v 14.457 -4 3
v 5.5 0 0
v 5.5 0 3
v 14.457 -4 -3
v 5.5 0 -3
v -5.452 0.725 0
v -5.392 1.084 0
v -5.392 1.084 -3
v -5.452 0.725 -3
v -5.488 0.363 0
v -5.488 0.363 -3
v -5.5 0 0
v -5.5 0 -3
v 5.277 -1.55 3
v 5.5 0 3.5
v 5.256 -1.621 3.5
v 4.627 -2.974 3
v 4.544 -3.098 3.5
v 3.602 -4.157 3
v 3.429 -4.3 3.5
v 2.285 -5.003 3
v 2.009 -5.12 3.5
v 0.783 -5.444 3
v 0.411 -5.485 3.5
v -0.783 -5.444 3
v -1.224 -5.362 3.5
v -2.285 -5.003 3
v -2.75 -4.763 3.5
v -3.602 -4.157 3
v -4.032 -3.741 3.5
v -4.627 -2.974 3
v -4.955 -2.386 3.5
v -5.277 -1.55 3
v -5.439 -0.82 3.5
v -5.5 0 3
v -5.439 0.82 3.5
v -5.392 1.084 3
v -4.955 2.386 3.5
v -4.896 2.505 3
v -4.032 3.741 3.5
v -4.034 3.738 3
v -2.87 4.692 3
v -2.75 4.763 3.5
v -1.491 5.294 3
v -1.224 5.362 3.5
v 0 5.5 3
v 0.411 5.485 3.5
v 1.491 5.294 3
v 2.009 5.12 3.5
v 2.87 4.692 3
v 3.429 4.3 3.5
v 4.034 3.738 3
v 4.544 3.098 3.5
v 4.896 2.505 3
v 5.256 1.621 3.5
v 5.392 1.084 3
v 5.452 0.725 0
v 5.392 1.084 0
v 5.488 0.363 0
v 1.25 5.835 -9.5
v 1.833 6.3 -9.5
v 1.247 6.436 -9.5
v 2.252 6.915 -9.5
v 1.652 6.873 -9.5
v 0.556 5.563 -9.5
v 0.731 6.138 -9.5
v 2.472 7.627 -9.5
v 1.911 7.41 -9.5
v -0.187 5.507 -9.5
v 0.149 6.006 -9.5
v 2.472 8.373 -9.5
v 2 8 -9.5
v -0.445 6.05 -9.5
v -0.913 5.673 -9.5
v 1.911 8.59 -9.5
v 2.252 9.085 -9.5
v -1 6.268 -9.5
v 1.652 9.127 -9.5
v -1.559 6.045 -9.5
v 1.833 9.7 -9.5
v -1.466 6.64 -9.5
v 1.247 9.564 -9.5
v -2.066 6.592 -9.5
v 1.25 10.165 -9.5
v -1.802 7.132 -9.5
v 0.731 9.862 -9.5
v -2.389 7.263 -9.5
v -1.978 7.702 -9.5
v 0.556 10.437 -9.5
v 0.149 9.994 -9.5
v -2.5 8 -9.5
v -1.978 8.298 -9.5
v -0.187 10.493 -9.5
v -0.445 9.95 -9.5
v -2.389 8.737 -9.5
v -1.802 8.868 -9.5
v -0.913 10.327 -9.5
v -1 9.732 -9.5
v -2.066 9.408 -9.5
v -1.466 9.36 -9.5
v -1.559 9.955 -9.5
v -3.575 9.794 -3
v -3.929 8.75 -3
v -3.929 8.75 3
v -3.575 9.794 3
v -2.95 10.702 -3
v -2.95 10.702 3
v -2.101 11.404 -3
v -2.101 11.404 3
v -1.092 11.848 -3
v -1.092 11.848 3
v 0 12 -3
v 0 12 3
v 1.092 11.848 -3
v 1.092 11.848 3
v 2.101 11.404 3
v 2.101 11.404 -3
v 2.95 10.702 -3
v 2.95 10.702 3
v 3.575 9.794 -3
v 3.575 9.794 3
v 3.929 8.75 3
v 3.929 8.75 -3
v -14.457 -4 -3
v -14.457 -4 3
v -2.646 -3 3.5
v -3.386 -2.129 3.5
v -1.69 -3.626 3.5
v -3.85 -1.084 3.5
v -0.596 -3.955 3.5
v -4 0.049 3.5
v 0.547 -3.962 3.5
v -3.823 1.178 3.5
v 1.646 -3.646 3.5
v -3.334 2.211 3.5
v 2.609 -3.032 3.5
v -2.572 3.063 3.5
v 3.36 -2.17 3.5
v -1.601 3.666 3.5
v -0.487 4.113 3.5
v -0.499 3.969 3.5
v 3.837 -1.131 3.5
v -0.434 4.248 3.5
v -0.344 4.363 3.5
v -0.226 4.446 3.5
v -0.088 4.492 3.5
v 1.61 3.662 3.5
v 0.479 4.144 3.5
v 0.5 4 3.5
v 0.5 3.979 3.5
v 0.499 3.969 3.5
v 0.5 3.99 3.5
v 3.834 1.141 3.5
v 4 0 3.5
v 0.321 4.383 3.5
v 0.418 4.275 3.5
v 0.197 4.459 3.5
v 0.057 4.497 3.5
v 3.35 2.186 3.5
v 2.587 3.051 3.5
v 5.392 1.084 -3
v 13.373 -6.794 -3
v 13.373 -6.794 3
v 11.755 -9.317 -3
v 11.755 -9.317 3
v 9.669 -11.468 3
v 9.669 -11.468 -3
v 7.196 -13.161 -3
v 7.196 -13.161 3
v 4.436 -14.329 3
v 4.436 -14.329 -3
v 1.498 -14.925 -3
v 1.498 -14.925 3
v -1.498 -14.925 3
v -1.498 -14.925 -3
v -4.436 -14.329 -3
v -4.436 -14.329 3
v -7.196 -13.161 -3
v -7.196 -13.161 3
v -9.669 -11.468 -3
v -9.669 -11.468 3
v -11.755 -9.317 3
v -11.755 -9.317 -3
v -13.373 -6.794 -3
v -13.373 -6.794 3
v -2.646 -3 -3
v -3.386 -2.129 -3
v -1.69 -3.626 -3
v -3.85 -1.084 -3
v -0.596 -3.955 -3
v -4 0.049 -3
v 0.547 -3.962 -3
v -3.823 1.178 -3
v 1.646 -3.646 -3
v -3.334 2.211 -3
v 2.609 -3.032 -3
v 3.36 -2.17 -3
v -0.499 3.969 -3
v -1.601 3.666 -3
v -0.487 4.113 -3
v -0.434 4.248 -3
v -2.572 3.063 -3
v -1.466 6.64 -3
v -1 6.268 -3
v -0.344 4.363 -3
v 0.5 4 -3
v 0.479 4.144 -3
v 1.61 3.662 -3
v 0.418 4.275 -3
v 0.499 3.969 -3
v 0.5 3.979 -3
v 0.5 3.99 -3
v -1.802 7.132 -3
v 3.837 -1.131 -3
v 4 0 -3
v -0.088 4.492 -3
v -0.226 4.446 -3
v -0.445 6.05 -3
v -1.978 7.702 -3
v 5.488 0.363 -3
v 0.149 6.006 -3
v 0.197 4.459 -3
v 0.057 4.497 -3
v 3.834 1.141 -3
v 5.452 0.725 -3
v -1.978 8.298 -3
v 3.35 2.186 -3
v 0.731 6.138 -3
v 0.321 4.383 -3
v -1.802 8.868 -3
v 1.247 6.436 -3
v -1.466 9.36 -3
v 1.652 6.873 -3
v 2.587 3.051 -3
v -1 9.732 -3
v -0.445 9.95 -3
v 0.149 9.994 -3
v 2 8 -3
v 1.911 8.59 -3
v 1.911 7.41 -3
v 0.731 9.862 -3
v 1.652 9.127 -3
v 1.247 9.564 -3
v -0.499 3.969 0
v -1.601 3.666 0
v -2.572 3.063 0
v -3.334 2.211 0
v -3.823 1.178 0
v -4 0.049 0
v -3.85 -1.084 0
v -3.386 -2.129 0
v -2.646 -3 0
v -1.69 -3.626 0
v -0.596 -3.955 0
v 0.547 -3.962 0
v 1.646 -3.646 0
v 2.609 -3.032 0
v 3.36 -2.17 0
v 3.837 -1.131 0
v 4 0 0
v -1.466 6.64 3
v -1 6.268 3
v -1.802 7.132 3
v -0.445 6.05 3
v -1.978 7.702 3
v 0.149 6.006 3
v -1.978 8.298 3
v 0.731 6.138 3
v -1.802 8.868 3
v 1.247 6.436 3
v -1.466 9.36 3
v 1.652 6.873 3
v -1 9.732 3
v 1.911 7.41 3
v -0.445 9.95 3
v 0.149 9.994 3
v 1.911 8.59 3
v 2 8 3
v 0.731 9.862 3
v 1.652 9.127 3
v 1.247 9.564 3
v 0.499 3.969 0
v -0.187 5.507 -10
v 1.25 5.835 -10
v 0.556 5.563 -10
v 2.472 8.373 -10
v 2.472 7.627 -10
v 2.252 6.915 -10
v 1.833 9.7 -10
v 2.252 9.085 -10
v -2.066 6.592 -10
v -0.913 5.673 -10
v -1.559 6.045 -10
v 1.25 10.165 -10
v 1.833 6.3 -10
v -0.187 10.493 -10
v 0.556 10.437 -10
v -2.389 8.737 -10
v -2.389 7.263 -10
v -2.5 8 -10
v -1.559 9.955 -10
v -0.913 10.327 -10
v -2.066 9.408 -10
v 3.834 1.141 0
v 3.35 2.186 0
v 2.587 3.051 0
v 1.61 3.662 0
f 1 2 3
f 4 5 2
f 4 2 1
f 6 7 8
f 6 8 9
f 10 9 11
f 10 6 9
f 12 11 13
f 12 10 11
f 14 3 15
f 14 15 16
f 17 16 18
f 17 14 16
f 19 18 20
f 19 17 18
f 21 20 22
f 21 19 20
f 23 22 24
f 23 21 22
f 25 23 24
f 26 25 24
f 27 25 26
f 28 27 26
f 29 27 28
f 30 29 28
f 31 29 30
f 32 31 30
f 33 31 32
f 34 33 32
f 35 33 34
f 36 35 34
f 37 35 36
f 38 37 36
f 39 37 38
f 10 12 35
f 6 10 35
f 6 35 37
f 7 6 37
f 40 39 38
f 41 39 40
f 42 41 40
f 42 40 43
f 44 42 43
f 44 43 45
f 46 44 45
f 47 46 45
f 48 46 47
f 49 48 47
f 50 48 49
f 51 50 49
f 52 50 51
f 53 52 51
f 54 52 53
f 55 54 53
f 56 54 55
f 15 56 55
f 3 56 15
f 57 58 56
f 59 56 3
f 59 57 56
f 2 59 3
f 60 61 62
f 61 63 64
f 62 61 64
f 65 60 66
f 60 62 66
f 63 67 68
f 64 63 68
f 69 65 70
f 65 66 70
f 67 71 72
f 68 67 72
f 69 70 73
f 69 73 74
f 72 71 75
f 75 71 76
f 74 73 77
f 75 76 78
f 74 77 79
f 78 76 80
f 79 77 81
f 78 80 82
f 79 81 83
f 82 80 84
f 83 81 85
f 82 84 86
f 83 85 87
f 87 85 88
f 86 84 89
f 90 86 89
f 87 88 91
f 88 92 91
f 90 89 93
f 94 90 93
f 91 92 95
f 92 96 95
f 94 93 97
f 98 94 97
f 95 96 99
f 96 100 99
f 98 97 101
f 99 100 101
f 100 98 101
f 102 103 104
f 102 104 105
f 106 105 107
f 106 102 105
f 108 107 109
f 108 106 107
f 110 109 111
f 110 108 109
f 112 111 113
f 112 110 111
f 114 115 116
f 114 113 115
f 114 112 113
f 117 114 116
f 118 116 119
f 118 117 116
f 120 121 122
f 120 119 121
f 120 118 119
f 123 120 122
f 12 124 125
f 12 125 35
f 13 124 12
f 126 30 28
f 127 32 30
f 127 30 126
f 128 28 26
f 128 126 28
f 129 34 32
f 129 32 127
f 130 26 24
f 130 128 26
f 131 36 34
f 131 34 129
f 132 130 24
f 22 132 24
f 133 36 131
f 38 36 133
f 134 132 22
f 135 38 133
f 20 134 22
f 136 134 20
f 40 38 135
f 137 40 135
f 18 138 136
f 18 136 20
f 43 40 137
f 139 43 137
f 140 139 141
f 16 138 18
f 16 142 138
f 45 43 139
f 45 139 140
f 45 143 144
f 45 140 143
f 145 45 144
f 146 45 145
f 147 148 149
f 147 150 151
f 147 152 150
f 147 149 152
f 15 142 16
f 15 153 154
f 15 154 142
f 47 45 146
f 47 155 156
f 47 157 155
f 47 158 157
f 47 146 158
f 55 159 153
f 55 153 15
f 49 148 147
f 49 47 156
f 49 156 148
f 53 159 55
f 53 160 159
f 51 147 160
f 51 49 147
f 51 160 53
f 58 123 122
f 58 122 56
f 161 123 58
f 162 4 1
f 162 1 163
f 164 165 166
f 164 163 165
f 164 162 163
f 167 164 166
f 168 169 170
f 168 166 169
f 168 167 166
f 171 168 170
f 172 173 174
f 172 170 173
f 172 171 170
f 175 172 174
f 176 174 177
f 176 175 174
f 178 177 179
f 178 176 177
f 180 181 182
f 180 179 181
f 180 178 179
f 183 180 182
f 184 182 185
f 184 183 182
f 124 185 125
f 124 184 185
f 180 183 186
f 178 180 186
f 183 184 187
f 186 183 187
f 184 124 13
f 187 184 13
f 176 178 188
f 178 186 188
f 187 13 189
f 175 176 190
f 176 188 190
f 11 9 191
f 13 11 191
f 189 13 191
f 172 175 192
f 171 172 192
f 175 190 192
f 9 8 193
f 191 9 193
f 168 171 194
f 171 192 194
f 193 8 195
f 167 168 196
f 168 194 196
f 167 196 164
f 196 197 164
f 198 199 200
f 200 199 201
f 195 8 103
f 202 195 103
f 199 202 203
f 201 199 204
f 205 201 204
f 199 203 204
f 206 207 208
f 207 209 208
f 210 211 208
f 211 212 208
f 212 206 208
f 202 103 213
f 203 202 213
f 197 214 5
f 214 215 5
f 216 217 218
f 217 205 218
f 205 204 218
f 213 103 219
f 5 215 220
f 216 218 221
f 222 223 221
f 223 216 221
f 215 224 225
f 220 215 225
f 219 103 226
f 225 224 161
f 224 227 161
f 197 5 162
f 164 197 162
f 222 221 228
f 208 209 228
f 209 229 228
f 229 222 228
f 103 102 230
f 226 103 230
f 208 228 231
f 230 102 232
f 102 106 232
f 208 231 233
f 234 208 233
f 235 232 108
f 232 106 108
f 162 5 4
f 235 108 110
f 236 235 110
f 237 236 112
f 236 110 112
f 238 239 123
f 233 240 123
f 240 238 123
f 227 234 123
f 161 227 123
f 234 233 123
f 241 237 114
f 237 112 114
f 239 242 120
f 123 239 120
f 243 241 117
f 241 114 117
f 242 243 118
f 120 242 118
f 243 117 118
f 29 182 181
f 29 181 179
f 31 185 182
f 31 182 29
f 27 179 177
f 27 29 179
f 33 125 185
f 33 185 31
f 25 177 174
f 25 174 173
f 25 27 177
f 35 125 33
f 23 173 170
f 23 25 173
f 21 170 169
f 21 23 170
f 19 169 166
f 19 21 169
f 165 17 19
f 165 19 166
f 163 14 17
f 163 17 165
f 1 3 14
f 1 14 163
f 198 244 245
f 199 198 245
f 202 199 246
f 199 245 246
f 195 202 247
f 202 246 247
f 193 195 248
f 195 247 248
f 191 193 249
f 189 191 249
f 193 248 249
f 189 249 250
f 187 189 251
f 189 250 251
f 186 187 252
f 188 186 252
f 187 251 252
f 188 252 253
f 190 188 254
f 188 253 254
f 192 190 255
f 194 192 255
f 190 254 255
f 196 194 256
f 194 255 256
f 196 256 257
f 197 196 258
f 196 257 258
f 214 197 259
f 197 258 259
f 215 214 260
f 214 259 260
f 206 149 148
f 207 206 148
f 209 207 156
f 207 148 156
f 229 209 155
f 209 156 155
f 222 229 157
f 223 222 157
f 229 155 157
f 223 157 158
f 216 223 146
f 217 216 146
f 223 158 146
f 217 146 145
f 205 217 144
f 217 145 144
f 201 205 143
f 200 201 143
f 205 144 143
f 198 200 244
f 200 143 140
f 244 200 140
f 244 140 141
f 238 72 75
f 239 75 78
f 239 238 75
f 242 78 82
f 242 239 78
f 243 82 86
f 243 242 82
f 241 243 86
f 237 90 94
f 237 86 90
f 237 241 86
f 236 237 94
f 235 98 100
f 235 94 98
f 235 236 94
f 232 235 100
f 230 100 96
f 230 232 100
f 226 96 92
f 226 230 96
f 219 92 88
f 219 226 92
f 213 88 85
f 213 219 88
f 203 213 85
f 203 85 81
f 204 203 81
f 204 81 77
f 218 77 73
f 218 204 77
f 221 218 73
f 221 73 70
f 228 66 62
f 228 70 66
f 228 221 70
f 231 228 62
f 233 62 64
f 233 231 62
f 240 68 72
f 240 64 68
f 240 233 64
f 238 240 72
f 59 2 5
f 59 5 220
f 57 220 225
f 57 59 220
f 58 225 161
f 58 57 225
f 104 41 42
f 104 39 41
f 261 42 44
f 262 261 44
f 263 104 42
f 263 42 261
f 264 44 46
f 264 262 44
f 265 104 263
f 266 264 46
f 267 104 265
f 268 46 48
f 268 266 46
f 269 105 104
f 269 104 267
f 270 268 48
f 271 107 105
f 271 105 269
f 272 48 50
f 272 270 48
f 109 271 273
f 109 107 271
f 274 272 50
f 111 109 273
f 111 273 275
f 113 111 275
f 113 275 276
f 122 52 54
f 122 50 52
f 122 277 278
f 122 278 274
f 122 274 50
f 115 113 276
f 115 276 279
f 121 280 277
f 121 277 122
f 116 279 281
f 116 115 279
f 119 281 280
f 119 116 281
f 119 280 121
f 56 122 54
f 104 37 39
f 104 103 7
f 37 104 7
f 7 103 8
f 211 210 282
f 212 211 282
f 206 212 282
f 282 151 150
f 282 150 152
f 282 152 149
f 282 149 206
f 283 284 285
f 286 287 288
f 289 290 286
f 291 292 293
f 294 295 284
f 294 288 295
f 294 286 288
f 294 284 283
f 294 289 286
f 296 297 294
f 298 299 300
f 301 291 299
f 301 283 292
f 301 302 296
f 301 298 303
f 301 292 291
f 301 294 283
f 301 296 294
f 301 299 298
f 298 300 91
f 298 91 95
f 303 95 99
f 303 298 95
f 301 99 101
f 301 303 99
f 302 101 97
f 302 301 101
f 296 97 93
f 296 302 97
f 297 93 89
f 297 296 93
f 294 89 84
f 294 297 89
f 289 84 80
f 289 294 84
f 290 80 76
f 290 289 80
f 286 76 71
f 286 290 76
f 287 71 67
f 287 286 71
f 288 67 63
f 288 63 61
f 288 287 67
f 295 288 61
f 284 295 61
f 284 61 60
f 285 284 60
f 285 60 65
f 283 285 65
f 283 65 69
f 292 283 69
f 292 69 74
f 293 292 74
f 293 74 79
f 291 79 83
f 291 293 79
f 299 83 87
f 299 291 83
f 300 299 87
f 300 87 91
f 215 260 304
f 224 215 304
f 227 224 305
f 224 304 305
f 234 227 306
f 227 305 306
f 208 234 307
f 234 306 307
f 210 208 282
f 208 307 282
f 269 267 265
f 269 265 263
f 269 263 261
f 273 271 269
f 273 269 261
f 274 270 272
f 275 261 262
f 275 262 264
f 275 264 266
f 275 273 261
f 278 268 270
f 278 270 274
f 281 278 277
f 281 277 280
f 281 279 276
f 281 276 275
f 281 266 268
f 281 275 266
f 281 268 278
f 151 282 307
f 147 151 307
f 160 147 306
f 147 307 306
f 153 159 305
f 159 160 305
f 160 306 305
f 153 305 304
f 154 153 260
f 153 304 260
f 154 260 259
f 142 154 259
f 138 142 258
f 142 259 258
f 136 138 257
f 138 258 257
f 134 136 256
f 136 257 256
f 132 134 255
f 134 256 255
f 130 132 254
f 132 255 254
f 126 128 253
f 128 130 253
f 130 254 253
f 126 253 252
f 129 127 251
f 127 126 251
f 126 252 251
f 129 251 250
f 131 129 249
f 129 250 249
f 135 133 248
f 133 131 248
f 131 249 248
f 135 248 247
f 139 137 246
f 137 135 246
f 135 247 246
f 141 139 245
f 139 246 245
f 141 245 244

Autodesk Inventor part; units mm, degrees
ref_plane "YZ Plane" through (0, 0, 0) normal (1, 0, 0) x (0, 1, 0)
ref_plane "XZ Plane" through (0, 0, 0) normal (0, 1, 0) x (-1, 0, 0)
ref_plane "XY Plane" through (0, 0, 0) normal (0, 0, 1) x (1, 0, 0)
sketch "Sketch1" plane through (0, 0, 0) normal (0, 0, 1) x (1, 0, 0)
  line L0 (0, 17.4) -> (0, -20.4) construction
  line L1 (-20.2396, 0) -> (20.2396, 0) construction
  circle A0 centre (0, 0) radius 5.5
  circle A1 centre (0, 8) radius 2
  arc A2 (-14.4568, -4) -> (14.4568, -4) centre (0, 0) ccw
  line L2 (-14.4568, -4) -> (-5.5, 0)
  line L3 (5.5, 0) -> (14.4568, -4)
  line L4 (-3.9291, 8.7499) -> (-5.3921, 1.0839)
  line L5 (3.9291, 8.7499) -> (5.3921, 1.0839)
  arc A3 (3.9291, 8.7499) -> (-3.9291, 8.7499) centre (0, 8) ccw
  circle A4 centre (0, 0) radius 4
  arc A5 (5.3921, 1.0839) -> (-5.3921, 1.0839) centre (0, 0) ccw
  dimension "d0" = 11
  dimension "d1" = 4
  dimension "d3" = 8
  dimension "d4" = 15
  dimension "d5" = 4
  dimension "d7" = 21.61
  dimension "d8" = 4
  dimension "d21" = 8
extrude "Extrusion1" add sketch "Sketch1" along normal mid plane 6 contours L3 A2 L2 A0 | A0 L4 A3 L5
extrude "Extrusion2" add sketch "Sketch1" along normal blind 3.5 contours A0
extrude "Extrusion3" add sketch "Sketch1" against normal up to surface (3 mm away) contours A0
sketch "Sketch2" plane through (0, 0, 3.5) normal (0, 0, 1) x (1, 0, 0)
  circle A0 centre (0, 0) radius 4 construction
  circle A1 centre (0, 0) radius 5.5 construction
  circle A2 centre (0, 4) radius 0.5
  dimension "d16" = 1
extrude "Extrusion4" cut sketch "Sketch2" against normal through all
extrude "Extrusion5" add sketch "Sketch1" against normal blind 10 contours A1
extrude "Extrusion6" add sketch "Sketch1" along normal up to surface (3 mm away) contours A1
sketch "Sketch3" plane through (0, 8, -10) normal (0, 0, -1) x (-1, 0, 0)
  circle A0 centre (0, 0) radius 2 construction
  circle A1 centre (0, 0) radius 2
  circle A2 centre (0, 0) radius 2 projected
  circle A3 centre (0, 0) radius 2.5
  arc A4 (5.3921, -6.9161) -> (-5.3921, -6.9161) centre (0, -8) ccw projected
extrude "Extrusion7" add sketch "Sketch3" against normal blind 0.5
properties part number "Crank" material "Iron, Cast"
